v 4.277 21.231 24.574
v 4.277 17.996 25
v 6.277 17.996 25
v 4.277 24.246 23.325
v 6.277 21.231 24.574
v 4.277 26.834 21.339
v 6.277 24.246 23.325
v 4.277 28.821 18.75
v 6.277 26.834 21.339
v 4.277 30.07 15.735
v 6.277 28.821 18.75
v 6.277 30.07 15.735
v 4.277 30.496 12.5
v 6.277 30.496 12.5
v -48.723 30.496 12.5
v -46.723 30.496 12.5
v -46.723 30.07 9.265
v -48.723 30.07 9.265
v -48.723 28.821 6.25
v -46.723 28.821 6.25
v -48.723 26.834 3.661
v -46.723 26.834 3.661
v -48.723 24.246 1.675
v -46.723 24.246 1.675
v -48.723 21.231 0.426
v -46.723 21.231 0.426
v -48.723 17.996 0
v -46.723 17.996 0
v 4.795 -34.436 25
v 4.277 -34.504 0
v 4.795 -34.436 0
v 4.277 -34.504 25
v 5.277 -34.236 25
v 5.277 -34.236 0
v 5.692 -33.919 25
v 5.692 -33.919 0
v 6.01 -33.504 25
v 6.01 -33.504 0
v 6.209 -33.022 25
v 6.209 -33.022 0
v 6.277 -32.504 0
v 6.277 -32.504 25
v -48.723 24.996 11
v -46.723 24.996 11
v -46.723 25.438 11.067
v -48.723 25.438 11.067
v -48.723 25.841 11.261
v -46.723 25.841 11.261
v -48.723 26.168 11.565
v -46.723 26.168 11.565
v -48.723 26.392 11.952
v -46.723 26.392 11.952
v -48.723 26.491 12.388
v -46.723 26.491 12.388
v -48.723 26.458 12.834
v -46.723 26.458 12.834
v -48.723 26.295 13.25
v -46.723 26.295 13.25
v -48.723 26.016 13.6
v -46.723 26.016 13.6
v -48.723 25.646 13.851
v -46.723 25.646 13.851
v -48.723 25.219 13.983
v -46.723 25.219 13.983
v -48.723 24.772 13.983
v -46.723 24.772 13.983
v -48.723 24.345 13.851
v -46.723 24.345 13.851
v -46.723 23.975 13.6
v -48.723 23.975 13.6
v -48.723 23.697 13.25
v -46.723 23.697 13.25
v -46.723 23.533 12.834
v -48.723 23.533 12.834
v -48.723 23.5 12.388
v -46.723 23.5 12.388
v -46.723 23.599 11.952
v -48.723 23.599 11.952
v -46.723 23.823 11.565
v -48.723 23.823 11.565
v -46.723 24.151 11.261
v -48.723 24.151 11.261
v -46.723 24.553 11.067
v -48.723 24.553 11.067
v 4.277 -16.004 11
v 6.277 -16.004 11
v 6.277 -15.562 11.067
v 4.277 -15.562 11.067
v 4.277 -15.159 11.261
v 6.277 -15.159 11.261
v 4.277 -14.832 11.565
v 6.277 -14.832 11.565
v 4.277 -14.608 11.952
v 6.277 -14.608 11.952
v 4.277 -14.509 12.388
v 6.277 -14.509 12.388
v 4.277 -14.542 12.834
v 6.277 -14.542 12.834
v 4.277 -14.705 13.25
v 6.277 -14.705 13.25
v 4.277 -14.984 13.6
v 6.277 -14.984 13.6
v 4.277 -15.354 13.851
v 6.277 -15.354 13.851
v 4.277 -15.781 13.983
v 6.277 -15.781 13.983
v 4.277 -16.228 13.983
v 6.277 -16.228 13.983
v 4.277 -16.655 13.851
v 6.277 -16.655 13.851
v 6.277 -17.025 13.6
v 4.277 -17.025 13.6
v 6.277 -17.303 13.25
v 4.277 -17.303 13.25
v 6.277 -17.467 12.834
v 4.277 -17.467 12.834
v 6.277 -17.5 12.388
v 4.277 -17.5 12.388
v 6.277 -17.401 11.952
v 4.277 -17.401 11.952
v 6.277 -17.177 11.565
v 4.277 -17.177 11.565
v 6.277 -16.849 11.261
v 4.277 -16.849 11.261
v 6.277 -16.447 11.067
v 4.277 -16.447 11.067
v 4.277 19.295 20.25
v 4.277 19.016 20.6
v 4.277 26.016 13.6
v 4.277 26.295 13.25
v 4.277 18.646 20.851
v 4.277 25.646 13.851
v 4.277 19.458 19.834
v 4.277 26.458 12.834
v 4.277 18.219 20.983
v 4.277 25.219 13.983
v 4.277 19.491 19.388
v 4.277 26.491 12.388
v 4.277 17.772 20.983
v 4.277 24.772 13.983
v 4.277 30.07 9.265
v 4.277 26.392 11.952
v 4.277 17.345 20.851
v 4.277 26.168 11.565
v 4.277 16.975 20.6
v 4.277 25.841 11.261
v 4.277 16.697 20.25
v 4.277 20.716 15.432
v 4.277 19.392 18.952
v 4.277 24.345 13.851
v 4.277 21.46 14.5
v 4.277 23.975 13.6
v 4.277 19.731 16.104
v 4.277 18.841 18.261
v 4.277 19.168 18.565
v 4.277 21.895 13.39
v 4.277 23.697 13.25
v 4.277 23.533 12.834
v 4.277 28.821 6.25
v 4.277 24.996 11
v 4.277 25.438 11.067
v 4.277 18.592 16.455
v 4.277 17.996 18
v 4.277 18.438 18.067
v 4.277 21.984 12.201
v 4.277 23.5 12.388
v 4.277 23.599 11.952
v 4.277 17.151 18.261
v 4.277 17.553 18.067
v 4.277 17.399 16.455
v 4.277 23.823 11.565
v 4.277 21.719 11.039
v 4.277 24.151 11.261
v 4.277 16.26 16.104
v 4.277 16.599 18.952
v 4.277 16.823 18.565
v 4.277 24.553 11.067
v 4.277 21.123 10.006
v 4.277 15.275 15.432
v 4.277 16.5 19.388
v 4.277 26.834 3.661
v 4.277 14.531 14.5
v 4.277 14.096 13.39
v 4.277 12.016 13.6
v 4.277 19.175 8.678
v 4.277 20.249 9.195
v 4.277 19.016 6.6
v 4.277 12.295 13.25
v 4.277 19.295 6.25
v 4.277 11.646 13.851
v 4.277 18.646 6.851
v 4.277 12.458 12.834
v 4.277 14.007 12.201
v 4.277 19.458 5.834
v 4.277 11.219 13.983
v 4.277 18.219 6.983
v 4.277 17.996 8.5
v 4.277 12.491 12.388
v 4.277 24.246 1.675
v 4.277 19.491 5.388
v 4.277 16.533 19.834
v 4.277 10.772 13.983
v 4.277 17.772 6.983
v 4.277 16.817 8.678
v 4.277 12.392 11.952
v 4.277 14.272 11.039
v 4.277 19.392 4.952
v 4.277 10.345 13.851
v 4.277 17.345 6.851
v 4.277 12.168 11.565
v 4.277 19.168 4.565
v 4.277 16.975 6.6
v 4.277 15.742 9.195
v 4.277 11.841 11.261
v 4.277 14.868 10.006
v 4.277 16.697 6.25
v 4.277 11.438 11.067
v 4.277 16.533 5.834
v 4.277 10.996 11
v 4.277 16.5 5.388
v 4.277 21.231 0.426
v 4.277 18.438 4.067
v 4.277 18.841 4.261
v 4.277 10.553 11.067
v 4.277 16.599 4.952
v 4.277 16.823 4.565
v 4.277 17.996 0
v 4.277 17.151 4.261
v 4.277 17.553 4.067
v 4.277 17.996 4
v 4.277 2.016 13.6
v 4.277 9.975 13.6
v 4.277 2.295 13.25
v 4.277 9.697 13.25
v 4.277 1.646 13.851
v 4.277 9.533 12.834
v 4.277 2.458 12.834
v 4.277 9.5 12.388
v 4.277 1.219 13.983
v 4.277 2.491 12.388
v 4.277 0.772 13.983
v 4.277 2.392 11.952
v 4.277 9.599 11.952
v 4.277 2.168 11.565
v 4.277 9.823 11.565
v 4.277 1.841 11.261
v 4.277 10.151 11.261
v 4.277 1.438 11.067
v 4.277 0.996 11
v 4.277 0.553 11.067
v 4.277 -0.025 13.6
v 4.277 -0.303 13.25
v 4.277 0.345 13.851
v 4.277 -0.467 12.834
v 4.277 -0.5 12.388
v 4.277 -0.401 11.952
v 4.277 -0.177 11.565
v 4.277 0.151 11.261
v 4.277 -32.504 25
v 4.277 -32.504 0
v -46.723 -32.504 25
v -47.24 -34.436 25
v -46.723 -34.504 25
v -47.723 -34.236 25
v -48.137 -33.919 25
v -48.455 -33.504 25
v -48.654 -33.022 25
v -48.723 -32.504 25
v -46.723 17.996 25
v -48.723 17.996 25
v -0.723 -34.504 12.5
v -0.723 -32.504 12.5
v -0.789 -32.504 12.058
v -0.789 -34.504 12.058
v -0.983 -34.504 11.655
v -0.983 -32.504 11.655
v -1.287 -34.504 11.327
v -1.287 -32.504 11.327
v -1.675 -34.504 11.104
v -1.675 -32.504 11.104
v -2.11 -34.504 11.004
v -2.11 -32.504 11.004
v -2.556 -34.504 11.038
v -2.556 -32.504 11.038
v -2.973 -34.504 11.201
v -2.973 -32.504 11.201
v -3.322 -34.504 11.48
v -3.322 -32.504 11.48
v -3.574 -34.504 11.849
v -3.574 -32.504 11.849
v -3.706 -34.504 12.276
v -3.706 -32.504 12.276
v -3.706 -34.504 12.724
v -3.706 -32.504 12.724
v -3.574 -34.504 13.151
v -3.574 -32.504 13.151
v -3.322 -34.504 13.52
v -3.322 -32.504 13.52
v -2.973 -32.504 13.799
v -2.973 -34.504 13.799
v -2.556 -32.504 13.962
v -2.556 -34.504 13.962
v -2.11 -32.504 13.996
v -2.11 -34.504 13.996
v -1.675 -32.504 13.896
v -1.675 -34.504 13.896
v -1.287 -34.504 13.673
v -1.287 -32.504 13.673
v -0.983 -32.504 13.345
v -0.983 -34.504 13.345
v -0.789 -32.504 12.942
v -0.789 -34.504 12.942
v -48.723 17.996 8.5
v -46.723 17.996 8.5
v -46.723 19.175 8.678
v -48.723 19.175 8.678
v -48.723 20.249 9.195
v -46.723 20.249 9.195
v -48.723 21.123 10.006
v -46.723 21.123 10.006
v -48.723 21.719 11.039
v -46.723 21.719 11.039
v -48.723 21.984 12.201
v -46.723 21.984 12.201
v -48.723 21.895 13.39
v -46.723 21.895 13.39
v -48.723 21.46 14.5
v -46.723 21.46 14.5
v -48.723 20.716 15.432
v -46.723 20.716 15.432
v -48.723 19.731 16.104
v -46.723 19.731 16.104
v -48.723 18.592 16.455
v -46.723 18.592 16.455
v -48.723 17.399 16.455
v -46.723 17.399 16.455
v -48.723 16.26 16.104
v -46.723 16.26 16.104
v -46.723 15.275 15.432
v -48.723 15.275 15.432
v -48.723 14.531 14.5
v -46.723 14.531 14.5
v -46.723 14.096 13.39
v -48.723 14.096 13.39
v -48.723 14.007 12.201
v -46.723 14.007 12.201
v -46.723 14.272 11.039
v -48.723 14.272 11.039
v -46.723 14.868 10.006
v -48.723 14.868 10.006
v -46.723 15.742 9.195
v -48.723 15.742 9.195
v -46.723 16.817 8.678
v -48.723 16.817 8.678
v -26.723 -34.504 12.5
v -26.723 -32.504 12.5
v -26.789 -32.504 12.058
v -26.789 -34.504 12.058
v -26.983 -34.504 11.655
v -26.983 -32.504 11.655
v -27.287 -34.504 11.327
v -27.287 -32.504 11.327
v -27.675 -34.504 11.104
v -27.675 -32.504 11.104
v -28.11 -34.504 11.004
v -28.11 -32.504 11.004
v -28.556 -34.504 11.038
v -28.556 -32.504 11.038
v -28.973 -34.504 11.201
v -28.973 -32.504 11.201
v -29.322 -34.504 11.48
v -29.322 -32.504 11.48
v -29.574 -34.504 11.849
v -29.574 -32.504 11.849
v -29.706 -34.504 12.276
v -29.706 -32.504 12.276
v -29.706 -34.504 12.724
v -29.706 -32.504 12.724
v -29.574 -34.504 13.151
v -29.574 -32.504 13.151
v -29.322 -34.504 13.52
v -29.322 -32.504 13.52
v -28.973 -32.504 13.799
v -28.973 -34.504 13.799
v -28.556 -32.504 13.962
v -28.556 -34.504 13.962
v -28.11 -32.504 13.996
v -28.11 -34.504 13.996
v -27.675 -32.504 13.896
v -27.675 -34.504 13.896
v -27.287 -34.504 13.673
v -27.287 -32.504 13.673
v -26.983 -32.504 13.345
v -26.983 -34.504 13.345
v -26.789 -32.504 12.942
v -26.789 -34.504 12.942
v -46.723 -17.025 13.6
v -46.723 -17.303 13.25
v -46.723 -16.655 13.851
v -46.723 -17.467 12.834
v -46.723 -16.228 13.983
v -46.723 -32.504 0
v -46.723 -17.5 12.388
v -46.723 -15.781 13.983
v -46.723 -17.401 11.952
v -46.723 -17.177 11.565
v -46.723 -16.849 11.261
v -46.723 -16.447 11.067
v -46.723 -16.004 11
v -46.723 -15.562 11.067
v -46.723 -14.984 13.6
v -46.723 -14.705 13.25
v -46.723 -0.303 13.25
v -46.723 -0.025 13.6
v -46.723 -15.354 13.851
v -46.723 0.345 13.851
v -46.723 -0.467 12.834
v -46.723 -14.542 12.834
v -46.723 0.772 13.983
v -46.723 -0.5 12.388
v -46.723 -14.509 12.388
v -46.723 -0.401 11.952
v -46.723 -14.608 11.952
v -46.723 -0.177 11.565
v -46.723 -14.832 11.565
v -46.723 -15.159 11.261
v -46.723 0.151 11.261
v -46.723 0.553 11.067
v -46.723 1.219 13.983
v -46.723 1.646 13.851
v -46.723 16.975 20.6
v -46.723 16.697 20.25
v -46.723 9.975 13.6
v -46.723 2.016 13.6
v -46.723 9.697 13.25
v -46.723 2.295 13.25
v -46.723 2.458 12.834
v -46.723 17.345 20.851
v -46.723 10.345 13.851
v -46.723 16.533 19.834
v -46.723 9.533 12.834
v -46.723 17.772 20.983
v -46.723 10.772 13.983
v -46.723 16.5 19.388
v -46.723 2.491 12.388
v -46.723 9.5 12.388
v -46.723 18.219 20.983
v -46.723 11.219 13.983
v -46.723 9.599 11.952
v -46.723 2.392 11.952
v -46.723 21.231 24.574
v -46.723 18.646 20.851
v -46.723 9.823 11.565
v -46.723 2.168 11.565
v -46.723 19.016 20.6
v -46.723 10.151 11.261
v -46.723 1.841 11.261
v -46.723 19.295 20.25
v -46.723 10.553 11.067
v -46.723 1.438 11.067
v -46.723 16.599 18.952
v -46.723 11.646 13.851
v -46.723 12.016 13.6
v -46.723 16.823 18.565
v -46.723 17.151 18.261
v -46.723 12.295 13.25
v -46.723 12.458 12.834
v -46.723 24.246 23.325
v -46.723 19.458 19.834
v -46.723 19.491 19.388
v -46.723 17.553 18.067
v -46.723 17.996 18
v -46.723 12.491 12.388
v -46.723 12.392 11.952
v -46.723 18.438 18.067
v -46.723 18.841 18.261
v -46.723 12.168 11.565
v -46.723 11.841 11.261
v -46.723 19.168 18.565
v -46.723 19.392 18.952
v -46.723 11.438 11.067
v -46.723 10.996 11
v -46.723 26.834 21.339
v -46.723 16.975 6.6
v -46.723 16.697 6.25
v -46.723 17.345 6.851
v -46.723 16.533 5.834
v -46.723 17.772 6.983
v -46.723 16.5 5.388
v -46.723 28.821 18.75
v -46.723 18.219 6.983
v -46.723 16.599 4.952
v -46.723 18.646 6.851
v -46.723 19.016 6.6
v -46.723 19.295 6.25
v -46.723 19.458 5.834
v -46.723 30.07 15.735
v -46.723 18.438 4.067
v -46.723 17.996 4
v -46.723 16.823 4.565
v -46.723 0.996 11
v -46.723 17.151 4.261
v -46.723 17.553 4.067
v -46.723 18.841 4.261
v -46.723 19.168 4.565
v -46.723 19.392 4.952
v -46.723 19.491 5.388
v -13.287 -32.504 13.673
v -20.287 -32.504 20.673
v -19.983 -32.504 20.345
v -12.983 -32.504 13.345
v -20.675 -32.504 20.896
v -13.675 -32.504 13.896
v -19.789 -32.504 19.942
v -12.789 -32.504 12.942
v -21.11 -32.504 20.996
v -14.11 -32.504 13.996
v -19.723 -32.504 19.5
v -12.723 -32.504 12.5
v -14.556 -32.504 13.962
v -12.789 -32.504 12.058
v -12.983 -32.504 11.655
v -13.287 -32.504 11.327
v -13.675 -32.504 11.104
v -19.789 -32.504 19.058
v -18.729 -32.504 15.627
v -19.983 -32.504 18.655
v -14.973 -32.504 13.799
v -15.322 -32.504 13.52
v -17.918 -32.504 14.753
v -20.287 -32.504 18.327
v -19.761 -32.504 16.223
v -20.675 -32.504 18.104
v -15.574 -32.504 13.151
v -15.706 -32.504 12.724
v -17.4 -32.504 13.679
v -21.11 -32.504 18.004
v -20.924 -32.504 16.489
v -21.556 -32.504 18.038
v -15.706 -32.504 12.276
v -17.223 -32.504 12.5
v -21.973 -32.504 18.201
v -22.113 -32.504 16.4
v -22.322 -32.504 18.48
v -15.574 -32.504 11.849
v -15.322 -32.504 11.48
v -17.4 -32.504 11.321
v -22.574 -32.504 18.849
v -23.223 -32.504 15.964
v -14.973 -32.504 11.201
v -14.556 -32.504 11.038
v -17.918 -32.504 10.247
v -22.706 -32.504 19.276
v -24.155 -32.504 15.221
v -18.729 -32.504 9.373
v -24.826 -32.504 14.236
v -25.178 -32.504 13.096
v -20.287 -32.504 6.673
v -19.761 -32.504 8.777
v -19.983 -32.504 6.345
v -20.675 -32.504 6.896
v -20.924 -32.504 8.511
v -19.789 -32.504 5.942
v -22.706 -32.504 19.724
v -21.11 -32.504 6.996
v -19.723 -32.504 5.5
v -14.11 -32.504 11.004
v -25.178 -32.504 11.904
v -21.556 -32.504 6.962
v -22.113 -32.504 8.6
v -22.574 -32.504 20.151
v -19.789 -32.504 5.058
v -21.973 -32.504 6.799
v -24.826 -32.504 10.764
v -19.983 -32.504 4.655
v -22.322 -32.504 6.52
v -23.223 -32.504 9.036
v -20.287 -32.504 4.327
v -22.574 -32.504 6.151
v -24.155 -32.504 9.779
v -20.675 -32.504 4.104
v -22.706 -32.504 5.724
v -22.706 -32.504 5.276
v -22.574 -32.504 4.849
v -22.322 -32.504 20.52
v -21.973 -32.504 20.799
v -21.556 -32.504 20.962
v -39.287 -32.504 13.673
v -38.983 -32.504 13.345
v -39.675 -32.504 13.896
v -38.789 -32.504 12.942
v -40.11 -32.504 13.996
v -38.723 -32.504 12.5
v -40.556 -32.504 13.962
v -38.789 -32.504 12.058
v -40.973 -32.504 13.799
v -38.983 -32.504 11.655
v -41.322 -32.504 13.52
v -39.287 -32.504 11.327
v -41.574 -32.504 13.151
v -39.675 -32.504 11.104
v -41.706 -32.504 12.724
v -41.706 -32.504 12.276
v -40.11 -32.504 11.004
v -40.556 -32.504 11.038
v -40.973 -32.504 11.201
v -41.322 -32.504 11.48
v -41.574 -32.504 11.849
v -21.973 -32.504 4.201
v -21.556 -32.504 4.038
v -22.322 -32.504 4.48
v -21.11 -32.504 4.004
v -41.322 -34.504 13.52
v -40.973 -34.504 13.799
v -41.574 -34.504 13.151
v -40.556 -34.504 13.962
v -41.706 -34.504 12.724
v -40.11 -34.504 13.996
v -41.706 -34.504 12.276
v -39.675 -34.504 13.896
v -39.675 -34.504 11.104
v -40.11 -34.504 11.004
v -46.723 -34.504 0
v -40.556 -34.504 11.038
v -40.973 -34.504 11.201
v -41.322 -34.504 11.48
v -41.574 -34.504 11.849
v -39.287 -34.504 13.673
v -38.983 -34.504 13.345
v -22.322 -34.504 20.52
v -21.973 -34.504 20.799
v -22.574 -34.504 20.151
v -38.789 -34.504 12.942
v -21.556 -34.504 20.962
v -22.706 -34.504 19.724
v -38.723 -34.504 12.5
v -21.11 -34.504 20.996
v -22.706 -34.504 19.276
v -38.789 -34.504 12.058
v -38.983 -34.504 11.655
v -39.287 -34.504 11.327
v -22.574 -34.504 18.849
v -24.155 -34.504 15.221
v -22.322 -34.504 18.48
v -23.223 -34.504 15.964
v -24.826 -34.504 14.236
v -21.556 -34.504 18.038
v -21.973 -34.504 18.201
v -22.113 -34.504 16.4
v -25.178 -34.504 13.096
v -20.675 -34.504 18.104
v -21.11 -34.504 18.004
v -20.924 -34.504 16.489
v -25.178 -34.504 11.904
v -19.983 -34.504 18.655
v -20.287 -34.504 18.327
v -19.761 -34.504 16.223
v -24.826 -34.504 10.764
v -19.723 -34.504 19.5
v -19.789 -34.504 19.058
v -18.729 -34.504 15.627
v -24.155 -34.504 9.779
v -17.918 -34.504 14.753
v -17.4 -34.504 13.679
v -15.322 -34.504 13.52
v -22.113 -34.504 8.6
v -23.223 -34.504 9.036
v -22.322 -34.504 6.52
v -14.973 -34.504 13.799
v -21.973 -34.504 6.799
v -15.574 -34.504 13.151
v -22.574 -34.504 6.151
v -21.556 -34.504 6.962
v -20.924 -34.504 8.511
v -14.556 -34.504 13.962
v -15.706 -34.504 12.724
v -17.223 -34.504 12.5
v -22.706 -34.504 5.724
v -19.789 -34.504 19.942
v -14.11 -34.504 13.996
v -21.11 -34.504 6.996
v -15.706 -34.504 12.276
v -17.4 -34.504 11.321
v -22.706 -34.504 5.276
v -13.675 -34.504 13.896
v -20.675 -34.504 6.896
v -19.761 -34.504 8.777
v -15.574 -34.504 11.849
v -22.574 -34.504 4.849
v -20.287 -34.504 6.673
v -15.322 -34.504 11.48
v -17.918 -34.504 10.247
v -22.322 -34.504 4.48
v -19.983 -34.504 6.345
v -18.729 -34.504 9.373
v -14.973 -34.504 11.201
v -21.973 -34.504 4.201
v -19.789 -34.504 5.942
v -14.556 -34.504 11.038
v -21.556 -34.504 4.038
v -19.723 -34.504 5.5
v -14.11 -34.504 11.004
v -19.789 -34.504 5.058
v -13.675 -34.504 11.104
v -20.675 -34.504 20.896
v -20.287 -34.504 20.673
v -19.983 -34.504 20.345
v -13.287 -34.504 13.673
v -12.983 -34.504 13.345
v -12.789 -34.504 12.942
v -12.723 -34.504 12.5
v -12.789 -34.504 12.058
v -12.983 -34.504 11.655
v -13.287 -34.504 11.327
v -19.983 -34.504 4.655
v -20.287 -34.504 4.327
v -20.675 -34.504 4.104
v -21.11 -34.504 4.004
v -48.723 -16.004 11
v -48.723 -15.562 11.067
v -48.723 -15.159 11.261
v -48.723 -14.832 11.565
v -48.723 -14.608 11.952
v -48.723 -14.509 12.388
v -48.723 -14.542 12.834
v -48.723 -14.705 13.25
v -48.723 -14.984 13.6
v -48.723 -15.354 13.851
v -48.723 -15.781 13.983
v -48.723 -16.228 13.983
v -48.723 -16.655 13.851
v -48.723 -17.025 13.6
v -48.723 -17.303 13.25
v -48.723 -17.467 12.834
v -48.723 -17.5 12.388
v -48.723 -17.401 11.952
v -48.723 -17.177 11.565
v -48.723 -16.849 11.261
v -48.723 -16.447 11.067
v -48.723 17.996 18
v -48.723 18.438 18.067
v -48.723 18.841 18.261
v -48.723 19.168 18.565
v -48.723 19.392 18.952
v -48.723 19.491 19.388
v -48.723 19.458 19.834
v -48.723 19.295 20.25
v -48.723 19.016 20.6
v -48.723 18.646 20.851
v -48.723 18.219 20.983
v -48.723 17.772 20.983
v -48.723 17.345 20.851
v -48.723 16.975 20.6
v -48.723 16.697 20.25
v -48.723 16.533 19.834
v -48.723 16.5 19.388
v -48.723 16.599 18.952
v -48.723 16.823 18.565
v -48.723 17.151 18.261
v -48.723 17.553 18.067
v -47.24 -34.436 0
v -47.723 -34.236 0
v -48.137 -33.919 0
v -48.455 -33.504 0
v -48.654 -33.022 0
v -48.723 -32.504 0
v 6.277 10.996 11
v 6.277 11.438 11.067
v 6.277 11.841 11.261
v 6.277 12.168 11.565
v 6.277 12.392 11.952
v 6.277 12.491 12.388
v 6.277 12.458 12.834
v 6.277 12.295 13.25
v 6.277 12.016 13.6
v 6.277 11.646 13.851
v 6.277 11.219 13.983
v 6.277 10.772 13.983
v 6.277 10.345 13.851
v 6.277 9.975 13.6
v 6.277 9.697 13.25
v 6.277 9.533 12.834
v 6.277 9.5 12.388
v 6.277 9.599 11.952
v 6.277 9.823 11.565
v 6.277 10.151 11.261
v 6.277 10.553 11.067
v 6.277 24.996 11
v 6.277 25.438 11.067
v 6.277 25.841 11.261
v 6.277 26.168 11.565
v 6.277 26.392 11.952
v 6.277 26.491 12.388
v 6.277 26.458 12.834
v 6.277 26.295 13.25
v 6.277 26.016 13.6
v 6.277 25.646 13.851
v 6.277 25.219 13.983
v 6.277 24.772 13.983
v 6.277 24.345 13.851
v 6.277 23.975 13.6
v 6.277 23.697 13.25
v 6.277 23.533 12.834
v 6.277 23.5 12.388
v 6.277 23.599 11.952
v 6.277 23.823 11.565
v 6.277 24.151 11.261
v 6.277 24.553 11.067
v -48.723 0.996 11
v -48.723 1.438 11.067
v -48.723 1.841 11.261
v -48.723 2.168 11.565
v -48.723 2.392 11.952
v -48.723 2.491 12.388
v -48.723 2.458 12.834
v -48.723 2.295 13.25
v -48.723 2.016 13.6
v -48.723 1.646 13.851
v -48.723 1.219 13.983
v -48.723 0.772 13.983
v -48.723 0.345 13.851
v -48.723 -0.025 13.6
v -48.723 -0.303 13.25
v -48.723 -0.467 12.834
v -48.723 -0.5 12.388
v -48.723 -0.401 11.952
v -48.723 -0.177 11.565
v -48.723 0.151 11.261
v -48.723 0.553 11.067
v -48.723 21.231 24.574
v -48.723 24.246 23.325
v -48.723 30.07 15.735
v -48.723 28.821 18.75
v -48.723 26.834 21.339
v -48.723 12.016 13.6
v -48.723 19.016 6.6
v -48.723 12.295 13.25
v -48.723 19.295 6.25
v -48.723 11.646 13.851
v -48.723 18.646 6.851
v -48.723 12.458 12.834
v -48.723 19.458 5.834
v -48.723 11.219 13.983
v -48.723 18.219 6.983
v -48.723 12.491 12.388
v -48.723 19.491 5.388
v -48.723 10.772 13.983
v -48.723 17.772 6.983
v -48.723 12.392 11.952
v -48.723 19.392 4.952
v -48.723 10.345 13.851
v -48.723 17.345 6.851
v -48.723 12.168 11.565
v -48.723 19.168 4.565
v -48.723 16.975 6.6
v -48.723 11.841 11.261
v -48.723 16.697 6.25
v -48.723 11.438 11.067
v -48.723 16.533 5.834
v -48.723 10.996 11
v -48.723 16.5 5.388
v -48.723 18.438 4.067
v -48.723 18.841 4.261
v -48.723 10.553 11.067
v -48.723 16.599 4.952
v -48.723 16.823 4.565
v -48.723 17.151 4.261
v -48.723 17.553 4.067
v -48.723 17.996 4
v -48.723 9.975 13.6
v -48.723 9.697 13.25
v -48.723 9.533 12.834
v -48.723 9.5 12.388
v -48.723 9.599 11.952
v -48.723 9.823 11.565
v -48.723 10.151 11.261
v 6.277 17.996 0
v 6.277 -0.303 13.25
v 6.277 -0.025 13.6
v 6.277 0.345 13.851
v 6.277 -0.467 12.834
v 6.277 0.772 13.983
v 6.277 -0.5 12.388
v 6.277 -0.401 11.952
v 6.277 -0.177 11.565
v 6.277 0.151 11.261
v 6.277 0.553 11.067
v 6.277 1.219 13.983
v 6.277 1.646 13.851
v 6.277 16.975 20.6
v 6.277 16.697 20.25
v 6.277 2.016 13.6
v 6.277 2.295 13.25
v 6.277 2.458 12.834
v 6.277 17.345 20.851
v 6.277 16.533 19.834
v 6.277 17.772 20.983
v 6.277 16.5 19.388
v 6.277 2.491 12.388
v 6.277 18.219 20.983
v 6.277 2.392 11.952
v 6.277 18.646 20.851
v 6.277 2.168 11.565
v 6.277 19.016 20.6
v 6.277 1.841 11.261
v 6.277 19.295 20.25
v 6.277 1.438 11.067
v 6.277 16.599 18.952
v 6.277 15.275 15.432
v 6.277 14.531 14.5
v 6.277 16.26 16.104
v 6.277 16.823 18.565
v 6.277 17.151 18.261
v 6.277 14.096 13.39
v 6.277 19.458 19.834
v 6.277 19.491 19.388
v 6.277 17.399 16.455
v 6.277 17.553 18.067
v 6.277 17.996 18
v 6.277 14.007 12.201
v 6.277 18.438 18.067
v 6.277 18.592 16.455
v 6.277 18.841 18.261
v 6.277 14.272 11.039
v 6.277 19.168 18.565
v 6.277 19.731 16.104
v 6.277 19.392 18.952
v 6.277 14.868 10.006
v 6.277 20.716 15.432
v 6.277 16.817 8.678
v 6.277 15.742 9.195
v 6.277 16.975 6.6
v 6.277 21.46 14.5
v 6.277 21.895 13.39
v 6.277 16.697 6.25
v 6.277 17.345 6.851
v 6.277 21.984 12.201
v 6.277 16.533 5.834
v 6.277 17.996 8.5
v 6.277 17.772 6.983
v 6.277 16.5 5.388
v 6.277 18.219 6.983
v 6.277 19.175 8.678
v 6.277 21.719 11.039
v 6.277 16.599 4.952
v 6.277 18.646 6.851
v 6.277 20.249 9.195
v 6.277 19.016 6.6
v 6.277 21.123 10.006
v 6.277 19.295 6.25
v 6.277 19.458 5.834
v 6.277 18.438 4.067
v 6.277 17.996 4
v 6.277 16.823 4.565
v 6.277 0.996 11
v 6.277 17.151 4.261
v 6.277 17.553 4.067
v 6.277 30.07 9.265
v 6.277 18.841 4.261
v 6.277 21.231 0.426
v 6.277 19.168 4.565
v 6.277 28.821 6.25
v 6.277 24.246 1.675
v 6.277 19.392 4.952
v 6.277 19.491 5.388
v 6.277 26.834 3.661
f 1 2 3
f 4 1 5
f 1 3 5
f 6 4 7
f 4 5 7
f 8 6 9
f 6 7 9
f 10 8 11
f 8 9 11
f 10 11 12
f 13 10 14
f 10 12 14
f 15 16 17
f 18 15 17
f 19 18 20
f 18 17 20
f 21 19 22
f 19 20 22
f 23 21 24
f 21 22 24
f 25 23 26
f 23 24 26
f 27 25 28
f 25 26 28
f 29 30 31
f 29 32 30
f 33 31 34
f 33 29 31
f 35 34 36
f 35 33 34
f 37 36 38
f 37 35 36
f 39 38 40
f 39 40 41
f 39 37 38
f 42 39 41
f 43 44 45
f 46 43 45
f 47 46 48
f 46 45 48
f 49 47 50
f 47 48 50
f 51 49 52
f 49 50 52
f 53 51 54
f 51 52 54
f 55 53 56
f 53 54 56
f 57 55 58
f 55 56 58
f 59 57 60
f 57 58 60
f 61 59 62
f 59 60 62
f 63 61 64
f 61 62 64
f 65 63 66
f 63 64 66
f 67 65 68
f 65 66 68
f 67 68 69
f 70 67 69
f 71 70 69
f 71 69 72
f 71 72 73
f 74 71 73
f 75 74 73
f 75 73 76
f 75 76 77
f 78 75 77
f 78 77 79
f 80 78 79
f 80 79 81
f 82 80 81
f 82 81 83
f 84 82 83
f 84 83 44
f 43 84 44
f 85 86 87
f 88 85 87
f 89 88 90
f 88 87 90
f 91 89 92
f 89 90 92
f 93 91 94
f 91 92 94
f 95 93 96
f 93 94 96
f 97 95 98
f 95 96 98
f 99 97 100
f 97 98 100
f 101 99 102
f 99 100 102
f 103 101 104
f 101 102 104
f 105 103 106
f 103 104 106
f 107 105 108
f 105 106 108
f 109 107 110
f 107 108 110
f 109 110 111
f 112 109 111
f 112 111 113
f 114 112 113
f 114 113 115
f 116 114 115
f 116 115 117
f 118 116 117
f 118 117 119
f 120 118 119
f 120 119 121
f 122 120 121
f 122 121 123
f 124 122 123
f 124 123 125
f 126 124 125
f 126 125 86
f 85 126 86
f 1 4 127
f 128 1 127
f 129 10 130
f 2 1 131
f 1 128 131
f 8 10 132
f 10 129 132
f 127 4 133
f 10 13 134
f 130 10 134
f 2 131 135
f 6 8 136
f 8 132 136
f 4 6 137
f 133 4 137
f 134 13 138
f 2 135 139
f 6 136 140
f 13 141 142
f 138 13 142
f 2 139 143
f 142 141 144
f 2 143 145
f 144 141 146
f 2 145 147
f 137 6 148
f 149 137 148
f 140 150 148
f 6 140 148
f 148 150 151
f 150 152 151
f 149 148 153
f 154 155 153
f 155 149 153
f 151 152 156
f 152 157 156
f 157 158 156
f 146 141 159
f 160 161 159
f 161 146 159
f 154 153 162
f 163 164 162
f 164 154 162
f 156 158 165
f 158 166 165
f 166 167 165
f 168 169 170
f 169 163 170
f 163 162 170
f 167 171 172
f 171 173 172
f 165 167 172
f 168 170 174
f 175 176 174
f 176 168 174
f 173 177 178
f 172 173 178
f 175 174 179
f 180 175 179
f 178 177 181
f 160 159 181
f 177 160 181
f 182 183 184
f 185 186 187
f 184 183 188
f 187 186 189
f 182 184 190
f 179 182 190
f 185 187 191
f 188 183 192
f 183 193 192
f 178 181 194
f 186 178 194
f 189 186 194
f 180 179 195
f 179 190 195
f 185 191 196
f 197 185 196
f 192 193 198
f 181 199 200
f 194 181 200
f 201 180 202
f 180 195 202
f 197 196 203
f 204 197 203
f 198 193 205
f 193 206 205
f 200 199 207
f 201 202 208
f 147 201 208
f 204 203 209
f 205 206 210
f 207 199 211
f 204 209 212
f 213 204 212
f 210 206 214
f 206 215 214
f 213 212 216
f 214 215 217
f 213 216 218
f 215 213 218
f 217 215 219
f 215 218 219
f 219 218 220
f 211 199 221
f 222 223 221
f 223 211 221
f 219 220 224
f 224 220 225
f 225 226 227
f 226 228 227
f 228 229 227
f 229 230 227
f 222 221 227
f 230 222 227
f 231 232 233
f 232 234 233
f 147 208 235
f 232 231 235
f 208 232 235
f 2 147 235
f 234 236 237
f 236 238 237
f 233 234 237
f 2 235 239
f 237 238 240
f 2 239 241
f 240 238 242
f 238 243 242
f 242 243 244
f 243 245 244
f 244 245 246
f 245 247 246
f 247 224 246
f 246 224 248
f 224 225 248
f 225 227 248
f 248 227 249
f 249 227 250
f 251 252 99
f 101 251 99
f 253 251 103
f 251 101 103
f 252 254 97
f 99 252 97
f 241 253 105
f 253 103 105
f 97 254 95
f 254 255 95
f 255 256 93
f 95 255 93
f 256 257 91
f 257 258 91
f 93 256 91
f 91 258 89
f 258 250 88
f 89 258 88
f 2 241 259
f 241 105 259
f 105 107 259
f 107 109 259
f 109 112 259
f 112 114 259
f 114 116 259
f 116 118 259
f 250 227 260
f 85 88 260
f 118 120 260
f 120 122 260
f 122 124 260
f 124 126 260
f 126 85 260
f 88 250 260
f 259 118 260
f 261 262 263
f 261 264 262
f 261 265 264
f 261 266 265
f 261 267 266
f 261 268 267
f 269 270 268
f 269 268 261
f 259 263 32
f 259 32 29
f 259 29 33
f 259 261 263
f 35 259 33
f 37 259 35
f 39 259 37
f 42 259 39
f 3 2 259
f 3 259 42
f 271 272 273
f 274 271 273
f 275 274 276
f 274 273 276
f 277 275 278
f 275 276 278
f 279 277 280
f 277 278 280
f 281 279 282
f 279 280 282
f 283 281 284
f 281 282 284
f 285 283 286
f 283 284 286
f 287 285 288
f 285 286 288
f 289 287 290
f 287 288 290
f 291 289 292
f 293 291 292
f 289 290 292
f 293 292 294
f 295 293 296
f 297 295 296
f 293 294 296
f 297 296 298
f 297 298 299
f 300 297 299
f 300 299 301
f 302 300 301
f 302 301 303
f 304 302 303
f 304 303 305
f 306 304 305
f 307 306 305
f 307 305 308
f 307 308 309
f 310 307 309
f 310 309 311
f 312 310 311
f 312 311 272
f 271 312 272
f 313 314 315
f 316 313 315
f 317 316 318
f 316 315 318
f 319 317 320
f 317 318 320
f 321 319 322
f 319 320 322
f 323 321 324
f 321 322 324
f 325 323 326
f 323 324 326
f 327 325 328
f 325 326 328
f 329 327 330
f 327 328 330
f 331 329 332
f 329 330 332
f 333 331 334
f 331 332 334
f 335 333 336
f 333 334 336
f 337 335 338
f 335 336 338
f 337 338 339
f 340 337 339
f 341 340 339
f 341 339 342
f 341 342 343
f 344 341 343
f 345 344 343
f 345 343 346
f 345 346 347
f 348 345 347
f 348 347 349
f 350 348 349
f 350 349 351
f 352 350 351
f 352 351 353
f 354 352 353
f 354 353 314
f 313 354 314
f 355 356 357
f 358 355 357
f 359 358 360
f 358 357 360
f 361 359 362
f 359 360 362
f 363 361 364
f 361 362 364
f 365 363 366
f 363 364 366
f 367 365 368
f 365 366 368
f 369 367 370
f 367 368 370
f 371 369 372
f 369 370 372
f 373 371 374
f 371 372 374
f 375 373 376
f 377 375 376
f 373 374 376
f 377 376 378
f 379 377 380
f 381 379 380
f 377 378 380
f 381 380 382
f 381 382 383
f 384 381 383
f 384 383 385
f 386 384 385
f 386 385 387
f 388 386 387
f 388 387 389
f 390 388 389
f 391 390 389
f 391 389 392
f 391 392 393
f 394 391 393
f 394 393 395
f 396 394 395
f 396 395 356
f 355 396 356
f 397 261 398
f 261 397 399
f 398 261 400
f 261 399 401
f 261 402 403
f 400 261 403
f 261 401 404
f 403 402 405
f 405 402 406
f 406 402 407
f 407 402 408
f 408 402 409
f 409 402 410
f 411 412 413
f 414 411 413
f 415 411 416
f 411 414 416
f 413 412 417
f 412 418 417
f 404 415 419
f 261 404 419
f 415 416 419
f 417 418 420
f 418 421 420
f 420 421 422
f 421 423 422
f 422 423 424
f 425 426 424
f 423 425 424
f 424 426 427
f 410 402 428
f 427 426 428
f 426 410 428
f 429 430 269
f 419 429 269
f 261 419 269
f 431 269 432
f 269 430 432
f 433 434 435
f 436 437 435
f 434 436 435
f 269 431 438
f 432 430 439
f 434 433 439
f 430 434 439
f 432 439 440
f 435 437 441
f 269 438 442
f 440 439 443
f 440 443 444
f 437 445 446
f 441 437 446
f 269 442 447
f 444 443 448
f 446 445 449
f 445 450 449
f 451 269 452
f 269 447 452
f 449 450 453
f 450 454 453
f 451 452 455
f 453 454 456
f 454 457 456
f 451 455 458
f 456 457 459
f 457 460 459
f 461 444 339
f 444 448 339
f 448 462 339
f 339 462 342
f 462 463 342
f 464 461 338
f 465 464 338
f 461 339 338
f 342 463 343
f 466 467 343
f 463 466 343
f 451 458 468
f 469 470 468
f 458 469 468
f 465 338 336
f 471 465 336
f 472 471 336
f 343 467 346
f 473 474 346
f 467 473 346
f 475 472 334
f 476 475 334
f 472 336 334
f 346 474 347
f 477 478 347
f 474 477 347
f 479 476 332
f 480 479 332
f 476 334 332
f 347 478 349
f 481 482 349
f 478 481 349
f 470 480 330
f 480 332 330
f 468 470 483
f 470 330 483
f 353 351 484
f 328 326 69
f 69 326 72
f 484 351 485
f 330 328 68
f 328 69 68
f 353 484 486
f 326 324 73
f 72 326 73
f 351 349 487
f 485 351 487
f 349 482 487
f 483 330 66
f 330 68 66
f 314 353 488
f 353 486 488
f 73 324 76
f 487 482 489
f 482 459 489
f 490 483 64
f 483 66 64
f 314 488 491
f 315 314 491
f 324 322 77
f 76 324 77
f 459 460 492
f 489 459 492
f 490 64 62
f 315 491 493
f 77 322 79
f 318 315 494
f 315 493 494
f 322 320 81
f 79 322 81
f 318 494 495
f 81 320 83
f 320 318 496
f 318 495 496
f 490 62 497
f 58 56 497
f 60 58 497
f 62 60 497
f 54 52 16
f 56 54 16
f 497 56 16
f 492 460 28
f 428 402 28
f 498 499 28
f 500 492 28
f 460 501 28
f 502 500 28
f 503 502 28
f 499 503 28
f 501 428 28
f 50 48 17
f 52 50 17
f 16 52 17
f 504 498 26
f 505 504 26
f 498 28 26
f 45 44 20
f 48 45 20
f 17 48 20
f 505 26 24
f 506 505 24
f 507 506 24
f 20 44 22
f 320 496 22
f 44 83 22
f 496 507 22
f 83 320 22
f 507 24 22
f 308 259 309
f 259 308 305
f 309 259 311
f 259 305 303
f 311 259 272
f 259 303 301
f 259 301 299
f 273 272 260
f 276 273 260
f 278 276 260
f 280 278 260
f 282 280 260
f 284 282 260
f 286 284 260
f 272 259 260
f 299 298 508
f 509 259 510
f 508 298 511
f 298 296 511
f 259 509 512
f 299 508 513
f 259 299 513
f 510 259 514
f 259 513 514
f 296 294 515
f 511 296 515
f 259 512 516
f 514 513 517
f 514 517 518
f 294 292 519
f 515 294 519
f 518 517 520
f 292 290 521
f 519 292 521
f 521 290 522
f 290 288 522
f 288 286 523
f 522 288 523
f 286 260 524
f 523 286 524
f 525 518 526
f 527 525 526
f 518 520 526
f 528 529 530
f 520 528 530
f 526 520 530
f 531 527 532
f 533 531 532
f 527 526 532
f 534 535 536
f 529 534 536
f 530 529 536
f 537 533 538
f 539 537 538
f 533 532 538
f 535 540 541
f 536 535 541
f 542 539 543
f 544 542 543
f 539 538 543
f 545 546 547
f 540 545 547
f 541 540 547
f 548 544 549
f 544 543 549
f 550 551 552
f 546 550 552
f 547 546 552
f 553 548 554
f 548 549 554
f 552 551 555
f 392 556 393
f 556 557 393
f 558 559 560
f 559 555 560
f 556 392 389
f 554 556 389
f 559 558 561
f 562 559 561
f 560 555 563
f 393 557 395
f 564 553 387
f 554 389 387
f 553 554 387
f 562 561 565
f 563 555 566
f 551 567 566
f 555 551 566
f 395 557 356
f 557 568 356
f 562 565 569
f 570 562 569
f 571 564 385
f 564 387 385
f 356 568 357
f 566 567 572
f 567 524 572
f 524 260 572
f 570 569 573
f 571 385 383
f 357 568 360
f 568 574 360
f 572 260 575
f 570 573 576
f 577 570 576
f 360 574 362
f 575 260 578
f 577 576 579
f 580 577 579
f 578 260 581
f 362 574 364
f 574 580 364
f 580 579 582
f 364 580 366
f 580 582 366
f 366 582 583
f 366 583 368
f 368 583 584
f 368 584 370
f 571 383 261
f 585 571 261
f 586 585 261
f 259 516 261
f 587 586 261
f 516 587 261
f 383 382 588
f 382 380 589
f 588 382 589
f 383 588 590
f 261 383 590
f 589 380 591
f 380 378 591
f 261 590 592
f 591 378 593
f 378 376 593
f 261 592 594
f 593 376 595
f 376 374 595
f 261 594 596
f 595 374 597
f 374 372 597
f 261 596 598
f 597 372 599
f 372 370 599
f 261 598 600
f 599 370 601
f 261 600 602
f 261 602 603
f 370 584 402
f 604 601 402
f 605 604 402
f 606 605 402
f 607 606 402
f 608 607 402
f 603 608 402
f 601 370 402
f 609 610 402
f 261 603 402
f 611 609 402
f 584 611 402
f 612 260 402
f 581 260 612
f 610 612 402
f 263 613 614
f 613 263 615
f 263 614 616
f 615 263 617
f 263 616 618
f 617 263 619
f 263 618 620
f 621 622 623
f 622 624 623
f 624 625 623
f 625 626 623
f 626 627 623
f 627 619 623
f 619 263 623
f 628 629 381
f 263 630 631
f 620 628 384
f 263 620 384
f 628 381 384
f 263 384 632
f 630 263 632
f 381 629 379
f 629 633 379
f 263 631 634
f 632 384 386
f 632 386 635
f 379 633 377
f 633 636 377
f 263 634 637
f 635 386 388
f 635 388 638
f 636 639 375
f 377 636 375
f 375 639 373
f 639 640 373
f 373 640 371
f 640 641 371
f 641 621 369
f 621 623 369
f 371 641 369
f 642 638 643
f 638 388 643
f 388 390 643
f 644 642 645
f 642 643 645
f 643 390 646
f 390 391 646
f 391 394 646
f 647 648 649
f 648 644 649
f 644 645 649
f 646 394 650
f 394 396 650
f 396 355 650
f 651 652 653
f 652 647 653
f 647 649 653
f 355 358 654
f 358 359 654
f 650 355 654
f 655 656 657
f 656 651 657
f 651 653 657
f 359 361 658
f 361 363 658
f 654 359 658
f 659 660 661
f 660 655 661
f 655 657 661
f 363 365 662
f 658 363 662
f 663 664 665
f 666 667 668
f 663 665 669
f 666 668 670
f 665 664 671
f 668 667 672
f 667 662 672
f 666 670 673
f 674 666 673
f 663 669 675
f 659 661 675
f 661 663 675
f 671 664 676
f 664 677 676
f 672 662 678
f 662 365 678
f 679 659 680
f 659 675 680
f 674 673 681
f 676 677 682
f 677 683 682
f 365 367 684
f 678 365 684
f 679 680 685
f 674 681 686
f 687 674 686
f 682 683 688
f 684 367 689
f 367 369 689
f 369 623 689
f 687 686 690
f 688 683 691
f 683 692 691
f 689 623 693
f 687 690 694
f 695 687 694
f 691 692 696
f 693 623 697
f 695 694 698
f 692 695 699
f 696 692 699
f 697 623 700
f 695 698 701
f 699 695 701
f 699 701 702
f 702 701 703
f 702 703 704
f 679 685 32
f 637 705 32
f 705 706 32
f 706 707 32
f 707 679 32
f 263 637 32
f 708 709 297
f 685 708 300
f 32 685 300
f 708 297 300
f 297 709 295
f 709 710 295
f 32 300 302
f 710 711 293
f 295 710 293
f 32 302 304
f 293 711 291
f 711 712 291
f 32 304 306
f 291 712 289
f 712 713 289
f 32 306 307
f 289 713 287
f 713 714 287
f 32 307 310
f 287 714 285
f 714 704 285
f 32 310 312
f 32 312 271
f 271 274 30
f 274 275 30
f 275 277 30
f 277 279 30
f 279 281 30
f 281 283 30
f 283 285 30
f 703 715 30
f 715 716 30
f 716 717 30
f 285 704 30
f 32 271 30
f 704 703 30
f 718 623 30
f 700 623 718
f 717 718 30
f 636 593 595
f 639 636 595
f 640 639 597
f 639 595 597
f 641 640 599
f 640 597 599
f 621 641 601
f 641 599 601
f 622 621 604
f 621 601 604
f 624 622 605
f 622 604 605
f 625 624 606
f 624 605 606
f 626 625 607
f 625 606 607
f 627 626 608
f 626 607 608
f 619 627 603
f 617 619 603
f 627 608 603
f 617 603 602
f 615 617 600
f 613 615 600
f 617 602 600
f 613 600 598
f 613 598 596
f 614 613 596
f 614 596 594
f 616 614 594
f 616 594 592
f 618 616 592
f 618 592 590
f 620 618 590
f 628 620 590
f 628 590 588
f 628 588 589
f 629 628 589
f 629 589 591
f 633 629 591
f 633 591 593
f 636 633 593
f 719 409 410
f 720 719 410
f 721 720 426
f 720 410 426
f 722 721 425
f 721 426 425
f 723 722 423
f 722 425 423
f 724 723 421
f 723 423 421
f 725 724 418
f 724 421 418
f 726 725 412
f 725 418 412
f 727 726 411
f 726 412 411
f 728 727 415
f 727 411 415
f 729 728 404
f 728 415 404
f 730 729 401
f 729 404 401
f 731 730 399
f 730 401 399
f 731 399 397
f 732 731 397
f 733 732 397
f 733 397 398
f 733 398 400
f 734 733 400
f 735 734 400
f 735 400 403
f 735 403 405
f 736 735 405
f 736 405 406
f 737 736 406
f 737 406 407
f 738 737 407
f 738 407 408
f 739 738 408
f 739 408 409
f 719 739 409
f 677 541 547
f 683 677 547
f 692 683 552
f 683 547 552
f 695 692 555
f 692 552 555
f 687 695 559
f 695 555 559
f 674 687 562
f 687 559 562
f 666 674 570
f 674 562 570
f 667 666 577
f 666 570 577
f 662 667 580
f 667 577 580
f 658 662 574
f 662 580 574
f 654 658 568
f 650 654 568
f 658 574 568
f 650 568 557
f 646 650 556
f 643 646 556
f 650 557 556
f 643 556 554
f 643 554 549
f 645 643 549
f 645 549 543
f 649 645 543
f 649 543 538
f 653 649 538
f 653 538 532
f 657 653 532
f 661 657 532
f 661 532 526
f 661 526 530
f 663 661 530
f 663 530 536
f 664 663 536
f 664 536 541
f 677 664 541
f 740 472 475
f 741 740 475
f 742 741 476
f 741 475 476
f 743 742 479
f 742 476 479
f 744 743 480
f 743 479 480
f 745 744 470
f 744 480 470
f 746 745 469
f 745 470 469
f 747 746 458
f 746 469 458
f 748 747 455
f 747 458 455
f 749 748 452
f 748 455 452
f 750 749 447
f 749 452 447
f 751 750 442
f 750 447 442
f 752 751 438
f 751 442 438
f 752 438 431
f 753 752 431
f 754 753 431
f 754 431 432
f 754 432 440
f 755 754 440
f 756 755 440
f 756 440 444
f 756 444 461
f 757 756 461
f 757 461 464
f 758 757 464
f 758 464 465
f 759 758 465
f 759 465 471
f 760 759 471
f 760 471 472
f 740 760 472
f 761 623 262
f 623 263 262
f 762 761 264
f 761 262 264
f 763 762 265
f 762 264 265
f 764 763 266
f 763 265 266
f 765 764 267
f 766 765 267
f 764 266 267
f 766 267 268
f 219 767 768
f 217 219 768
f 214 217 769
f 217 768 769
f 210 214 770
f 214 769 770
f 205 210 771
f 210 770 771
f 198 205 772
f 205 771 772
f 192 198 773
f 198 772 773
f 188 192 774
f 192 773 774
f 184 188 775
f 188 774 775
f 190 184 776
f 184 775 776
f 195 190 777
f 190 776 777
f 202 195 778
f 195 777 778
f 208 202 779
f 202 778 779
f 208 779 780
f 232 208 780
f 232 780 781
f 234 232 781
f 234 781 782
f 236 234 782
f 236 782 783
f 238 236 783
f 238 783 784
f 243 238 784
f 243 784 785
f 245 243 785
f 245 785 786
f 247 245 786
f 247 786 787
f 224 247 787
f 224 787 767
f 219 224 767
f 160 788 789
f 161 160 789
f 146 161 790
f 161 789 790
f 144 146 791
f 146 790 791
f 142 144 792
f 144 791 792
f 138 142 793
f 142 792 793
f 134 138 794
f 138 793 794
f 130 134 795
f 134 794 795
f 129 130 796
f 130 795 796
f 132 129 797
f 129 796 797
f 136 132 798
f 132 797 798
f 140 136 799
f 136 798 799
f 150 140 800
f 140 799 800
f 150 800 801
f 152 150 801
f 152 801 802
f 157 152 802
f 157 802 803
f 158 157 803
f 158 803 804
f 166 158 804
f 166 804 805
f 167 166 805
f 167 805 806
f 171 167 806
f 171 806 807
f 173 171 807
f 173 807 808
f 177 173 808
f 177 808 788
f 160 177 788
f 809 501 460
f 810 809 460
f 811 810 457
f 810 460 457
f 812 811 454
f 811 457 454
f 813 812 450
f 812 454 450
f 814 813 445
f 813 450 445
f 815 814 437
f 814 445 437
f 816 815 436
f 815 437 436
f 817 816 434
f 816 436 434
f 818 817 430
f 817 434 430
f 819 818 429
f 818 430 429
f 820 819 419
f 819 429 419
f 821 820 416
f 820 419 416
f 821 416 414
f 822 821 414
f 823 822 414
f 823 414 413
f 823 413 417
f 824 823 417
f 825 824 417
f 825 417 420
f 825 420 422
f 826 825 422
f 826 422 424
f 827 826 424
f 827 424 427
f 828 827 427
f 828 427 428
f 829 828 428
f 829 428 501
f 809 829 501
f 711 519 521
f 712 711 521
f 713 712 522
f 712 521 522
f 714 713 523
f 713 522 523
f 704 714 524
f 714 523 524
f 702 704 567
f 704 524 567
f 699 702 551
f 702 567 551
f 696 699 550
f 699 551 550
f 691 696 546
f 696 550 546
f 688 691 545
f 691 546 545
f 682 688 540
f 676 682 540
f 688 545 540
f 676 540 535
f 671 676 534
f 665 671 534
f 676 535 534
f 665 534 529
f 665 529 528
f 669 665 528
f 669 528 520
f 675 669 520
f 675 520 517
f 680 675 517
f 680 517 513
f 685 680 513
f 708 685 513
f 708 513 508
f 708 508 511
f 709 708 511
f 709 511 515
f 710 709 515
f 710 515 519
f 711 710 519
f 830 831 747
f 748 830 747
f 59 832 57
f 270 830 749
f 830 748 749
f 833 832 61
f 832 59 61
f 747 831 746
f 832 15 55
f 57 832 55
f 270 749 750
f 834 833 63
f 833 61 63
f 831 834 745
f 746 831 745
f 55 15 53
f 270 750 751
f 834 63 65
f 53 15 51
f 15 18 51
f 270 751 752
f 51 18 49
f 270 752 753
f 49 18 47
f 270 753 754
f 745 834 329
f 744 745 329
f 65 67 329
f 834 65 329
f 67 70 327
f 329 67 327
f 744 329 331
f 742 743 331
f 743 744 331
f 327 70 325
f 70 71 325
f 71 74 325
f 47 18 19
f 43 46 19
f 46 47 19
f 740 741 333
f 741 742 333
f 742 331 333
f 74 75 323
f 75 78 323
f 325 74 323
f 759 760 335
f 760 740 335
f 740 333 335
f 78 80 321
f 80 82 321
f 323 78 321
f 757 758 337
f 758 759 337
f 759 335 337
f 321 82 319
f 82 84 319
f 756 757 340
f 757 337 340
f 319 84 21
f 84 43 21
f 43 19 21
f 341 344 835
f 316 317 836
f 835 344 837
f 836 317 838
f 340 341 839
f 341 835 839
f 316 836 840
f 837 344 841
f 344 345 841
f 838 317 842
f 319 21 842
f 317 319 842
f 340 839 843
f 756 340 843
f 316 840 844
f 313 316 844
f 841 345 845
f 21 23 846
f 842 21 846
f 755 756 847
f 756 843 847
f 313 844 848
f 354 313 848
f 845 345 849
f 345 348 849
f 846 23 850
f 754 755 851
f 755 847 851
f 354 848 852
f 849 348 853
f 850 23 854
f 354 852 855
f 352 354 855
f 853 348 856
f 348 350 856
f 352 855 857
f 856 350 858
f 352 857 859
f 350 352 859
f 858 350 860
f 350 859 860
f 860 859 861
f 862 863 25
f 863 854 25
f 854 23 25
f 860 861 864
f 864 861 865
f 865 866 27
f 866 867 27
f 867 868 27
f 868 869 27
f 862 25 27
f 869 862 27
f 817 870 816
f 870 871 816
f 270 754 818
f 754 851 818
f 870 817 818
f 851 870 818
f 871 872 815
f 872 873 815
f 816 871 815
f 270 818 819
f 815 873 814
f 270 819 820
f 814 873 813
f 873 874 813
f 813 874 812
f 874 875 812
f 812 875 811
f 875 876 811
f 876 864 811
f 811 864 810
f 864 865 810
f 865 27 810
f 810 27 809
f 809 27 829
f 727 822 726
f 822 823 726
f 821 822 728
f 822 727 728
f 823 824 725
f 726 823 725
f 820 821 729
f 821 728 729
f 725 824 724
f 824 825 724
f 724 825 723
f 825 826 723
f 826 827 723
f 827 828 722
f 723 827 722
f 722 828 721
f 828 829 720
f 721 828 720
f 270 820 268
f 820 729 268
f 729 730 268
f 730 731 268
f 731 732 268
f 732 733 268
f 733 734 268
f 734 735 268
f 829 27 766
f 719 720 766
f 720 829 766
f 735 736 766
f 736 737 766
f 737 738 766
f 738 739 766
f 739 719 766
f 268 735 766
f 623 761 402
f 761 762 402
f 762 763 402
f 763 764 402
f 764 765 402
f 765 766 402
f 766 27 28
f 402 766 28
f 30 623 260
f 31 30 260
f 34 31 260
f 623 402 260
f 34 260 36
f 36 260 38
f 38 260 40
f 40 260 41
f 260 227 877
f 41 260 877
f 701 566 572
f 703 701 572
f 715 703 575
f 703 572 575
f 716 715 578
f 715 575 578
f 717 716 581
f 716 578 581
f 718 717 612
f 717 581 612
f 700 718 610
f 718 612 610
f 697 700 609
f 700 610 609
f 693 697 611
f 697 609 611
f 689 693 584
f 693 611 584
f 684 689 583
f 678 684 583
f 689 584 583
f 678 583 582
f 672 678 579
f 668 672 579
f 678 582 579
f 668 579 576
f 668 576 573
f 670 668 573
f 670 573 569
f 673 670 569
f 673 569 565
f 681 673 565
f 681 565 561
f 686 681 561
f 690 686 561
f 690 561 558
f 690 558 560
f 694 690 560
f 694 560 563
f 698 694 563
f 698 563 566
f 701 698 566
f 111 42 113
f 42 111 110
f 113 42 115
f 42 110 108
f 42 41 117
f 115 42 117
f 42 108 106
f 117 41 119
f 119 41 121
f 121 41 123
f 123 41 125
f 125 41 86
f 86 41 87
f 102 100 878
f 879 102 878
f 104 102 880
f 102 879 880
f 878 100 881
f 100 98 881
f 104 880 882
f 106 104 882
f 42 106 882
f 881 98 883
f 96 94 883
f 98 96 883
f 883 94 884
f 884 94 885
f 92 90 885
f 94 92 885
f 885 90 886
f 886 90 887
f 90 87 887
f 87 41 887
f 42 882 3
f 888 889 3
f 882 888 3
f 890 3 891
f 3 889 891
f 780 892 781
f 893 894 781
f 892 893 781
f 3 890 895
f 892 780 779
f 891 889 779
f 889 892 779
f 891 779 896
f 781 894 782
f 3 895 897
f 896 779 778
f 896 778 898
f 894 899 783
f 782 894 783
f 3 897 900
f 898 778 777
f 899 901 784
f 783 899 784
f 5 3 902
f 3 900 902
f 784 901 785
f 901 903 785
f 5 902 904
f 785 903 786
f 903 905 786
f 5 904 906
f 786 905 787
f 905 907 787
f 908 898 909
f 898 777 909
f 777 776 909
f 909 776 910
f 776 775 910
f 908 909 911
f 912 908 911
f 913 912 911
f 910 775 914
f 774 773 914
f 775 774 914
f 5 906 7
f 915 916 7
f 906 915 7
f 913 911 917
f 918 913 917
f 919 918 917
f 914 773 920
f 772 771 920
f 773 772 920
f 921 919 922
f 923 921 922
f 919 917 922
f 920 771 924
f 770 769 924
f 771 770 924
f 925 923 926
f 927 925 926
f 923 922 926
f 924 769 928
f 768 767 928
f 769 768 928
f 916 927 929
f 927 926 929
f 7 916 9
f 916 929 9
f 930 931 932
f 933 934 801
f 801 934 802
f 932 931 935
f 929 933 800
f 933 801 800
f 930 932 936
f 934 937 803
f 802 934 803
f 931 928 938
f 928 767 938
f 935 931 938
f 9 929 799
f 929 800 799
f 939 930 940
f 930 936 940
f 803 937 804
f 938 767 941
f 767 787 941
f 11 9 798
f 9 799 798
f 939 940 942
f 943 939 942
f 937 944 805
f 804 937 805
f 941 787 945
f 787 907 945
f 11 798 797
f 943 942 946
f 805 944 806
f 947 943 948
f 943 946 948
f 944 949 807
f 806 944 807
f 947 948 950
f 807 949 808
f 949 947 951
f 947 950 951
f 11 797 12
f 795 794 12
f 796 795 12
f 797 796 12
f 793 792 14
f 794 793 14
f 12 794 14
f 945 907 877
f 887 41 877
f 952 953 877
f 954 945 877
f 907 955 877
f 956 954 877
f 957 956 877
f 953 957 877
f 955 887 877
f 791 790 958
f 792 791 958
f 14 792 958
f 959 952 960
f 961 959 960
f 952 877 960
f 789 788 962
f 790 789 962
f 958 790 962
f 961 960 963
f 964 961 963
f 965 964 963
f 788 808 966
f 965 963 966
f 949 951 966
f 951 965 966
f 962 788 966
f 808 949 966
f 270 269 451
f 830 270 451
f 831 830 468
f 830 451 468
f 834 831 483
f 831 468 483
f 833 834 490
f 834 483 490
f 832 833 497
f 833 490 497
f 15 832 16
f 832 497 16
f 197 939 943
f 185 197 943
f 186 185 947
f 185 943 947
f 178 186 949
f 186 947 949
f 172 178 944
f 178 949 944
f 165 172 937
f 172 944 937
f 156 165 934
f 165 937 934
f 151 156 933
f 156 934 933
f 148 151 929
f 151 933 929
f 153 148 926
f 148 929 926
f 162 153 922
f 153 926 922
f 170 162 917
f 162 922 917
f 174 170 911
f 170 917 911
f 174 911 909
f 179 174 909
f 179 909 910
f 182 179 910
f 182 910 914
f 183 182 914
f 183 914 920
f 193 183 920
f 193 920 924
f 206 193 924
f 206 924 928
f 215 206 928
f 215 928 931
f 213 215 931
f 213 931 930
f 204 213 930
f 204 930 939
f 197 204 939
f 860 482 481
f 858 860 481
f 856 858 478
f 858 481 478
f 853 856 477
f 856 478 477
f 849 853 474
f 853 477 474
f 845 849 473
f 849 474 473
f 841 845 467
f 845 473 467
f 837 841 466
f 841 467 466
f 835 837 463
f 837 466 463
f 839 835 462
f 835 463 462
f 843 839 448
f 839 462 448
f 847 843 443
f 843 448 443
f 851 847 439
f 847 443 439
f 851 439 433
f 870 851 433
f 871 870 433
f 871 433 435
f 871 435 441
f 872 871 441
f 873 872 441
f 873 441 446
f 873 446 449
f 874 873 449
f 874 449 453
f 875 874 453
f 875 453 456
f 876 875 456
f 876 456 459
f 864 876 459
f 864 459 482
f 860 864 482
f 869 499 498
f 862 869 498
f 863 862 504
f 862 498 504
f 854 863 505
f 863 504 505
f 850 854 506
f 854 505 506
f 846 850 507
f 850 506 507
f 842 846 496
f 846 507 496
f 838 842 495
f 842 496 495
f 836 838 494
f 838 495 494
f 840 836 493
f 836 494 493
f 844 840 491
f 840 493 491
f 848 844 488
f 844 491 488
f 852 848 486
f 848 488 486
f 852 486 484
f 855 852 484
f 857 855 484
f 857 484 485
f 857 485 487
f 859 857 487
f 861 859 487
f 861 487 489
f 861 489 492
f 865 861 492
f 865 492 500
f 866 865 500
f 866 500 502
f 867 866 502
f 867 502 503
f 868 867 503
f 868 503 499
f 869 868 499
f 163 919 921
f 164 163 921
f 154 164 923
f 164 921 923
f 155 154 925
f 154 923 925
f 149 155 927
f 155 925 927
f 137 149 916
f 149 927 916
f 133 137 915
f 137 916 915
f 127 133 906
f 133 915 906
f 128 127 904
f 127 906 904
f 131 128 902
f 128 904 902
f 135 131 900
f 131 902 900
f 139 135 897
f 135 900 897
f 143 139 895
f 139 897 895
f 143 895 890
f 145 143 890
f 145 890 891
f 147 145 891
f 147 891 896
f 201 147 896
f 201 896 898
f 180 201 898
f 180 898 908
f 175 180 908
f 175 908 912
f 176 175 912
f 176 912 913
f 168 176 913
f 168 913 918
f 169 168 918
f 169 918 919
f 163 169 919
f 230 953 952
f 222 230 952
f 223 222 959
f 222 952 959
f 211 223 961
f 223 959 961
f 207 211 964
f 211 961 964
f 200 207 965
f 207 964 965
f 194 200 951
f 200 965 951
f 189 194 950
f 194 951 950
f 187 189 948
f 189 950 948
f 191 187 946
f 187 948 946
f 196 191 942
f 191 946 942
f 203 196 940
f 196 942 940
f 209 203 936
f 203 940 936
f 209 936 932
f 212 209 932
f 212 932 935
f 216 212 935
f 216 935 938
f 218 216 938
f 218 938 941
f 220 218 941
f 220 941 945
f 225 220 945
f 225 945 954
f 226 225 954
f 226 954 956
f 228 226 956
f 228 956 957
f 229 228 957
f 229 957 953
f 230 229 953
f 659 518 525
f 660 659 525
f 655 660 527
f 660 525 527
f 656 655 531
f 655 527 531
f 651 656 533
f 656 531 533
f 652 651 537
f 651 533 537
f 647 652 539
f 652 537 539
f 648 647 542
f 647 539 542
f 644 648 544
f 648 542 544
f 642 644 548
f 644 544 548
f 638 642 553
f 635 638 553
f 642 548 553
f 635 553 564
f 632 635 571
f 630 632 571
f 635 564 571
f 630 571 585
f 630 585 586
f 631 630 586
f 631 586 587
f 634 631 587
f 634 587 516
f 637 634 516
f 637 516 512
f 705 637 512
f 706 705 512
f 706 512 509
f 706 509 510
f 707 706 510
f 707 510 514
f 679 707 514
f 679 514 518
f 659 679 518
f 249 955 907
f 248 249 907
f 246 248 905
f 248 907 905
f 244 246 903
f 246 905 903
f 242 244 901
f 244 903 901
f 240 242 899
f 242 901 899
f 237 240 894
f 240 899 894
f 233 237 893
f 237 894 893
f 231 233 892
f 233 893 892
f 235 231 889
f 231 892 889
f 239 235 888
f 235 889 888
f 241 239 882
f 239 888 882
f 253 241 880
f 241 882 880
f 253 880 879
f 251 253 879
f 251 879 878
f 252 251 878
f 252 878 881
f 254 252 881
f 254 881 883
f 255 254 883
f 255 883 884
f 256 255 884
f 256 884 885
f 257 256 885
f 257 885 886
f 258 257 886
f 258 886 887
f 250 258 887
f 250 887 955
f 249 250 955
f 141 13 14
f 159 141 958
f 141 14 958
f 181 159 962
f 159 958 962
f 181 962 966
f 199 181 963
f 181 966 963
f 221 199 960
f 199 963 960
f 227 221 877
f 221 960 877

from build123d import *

# Parameters (mm, degrees)
ESTRUSIONE_ESTRUSIONE1_DEPTH  = 25
RACCORDO1_R                   = 2
RACCORDO2_R                   = 2
TAGLIO_ESTRUSIONE5_DEPTH      = 1
TAGLIO_ESTRUSIONE5_DEPTH_BACK = 56
SCHIZZO8_9_R                  = 1.5
SCHIZZO8_9_R_2                = 4
TAGLIO_ESTRUSIONE6_DEPTH      = 1
TAGLIO_ESTRUSIONE6_DEPTH_BACK = 56
SCHIZZO11_R                   = 4
SCHIZZO11_R_2                 = 1.5
TAGLIO_ESTRUSIONE7_DEPTH      = 64
TAGLIO_ESTRUSIONE7_DEPTH_BACK = 3


with BuildPart() as part:
    # Schizzo4 → Estrusione-Estrusione1 (new body)
    with BuildSketch(Plane.XY):
        Polygon((-48.72252025, 30.495594714), (-48.72252025, -34.504405286), (6.27747975, -34.504405286), (6.27747975, 30.495594714), (4.27747975, 30.495594714), (4.27747975, -32.504405286), (-46.72252025, -32.504405286), (-46.72252025, 30.495594714), align=None)
    extrude(amount=ESTRUSIONE_ESTRUSIONE1_DEPTH)

    # Raccordo1
    raccordo1_edges = [part.edges().sort_by_distance(p)[0] for p in [
        (6.27747975, -34.504405286, 12.5),
    ]]
    fillet(raccordo1_edges, radius=RACCORDO1_R)

    # Raccordo2
    raccordo2_edges = [part.edges().sort_by_distance(p)[0] for p in [
        (-48.72252025, -34.504405286, 12.5),
    ]]
    fillet(raccordo2_edges, radius=RACCORDO2_R)

    # Schizzo8 → Taglio-Estrusione5 (cut, two sides)
    with BuildSketch(Plane(origin=(6.27747975, 0, 0), x_dir=(0, 0, -1), z_dir=(1, 0, 0))) as taglio_estrusione5_sk:
        with BuildLine():
            Line((0, 30.495594714), (-12.5, 30.495594714))
            ThreePointArc((-12.5, 30.495594714), (-3.661165235, 26.834429478), (0, 17.995594714))
            Line((0, 17.995594714), (0, 30.495594714))
        make_face()
        with BuildLine():
            Line((-12.5, 30.495594714), (-25, 30.495594714))
            Line((-25, 30.495594714), (-25, 17.995594714))
            ThreePointArc((-25, 17.995594714), (-21.338834765, 26.834429478), (-12.5, 30.495594714))
        make_face()
    extrude(amount=TAGLIO_ESTRUSIONE5_DEPTH, mode=Mode.SUBTRACT)
    extrude(taglio_estrusione5_sk.sketch, amount=-TAGLIO_ESTRUSIONE5_DEPTH_BACK, mode=Mode.SUBTRACT)

    # Schizzo8<9> → Taglio-Estrusione6 (cut, two sides)
    with BuildSketch(Plane(origin=(6.27747975, 0, 0), x_dir=(0, 0, -1), z_dir=(1, 0, 0))) as taglio_estrusione6_sk:
        with Locations((-19.5, 17.995594714)):
            Circle(SCHIZZO8_9_R)
        with Locations((-12.5, 17.995594714)):
            Circle(SCHIZZO8_9_R_2)
        with Locations((-12.5, 24.995594714)):
            Circle(SCHIZZO8_9_R)
        with Locations((-5.5, 17.995594714)):
            Circle(SCHIZZO8_9_R)
        with Locations((-12.5, 10.995594714)):
            Circle(SCHIZZO8_9_R)
        with Locations((-12.5, 0.995594714)):
            Circle(SCHIZZO8_9_R)
        with Locations((-12.5, -16.004405286)):
            Circle(SCHIZZO8_9_R)
    extrude(amount=TAGLIO_ESTRUSIONE6_DEPTH, mode=Mode.SUBTRACT)
    extrude(taglio_estrusione6_sk.sketch, amount=-TAGLIO_ESTRUSIONE6_DEPTH_BACK, mode=Mode.SUBTRACT)

    # Schizzo11 → Taglio-Estrusione7 (cut, two sides)
    with BuildSketch(Plane(origin=(0, -32.504405286, 0), x_dir=(1, 0, 0), z_dir=(0, 1, 0))) as taglio_estrusione7_sk:
        with Locations((-21.22252025, -12.5)):
            Circle(SCHIZZO11_R)
        with Locations((-21.22252025, -5.5)):
            Circle(SCHIZZO11_R_2)
        with Locations((-28.22252025, -12.5)):
            Circle(SCHIZZO11_R_2)
        with Locations((-21.22252025, -19.5)):
            Circle(SCHIZZO11_R_2)
        with Locations((-14.22252025, -12.5)):
            Circle(SCHIZZO11_R_2)
        with Locations((-2.22252025, -12.5)):
            Circle(SCHIZZO11_R_2)
        with Locations((-40.22252025, -12.5)):
            Circle(SCHIZZO11_R_2)
    extrude(amount=TAGLIO_ESTRUSIONE7_DEPTH, mode=Mode.SUBTRACT)
    extrude(taglio_estrusione7_sk.sketch, amount=-TAGLIO_ESTRUSIONE7_DEPTH_BACK, mode=Mode.SUBTRACT)


solid = part.part
